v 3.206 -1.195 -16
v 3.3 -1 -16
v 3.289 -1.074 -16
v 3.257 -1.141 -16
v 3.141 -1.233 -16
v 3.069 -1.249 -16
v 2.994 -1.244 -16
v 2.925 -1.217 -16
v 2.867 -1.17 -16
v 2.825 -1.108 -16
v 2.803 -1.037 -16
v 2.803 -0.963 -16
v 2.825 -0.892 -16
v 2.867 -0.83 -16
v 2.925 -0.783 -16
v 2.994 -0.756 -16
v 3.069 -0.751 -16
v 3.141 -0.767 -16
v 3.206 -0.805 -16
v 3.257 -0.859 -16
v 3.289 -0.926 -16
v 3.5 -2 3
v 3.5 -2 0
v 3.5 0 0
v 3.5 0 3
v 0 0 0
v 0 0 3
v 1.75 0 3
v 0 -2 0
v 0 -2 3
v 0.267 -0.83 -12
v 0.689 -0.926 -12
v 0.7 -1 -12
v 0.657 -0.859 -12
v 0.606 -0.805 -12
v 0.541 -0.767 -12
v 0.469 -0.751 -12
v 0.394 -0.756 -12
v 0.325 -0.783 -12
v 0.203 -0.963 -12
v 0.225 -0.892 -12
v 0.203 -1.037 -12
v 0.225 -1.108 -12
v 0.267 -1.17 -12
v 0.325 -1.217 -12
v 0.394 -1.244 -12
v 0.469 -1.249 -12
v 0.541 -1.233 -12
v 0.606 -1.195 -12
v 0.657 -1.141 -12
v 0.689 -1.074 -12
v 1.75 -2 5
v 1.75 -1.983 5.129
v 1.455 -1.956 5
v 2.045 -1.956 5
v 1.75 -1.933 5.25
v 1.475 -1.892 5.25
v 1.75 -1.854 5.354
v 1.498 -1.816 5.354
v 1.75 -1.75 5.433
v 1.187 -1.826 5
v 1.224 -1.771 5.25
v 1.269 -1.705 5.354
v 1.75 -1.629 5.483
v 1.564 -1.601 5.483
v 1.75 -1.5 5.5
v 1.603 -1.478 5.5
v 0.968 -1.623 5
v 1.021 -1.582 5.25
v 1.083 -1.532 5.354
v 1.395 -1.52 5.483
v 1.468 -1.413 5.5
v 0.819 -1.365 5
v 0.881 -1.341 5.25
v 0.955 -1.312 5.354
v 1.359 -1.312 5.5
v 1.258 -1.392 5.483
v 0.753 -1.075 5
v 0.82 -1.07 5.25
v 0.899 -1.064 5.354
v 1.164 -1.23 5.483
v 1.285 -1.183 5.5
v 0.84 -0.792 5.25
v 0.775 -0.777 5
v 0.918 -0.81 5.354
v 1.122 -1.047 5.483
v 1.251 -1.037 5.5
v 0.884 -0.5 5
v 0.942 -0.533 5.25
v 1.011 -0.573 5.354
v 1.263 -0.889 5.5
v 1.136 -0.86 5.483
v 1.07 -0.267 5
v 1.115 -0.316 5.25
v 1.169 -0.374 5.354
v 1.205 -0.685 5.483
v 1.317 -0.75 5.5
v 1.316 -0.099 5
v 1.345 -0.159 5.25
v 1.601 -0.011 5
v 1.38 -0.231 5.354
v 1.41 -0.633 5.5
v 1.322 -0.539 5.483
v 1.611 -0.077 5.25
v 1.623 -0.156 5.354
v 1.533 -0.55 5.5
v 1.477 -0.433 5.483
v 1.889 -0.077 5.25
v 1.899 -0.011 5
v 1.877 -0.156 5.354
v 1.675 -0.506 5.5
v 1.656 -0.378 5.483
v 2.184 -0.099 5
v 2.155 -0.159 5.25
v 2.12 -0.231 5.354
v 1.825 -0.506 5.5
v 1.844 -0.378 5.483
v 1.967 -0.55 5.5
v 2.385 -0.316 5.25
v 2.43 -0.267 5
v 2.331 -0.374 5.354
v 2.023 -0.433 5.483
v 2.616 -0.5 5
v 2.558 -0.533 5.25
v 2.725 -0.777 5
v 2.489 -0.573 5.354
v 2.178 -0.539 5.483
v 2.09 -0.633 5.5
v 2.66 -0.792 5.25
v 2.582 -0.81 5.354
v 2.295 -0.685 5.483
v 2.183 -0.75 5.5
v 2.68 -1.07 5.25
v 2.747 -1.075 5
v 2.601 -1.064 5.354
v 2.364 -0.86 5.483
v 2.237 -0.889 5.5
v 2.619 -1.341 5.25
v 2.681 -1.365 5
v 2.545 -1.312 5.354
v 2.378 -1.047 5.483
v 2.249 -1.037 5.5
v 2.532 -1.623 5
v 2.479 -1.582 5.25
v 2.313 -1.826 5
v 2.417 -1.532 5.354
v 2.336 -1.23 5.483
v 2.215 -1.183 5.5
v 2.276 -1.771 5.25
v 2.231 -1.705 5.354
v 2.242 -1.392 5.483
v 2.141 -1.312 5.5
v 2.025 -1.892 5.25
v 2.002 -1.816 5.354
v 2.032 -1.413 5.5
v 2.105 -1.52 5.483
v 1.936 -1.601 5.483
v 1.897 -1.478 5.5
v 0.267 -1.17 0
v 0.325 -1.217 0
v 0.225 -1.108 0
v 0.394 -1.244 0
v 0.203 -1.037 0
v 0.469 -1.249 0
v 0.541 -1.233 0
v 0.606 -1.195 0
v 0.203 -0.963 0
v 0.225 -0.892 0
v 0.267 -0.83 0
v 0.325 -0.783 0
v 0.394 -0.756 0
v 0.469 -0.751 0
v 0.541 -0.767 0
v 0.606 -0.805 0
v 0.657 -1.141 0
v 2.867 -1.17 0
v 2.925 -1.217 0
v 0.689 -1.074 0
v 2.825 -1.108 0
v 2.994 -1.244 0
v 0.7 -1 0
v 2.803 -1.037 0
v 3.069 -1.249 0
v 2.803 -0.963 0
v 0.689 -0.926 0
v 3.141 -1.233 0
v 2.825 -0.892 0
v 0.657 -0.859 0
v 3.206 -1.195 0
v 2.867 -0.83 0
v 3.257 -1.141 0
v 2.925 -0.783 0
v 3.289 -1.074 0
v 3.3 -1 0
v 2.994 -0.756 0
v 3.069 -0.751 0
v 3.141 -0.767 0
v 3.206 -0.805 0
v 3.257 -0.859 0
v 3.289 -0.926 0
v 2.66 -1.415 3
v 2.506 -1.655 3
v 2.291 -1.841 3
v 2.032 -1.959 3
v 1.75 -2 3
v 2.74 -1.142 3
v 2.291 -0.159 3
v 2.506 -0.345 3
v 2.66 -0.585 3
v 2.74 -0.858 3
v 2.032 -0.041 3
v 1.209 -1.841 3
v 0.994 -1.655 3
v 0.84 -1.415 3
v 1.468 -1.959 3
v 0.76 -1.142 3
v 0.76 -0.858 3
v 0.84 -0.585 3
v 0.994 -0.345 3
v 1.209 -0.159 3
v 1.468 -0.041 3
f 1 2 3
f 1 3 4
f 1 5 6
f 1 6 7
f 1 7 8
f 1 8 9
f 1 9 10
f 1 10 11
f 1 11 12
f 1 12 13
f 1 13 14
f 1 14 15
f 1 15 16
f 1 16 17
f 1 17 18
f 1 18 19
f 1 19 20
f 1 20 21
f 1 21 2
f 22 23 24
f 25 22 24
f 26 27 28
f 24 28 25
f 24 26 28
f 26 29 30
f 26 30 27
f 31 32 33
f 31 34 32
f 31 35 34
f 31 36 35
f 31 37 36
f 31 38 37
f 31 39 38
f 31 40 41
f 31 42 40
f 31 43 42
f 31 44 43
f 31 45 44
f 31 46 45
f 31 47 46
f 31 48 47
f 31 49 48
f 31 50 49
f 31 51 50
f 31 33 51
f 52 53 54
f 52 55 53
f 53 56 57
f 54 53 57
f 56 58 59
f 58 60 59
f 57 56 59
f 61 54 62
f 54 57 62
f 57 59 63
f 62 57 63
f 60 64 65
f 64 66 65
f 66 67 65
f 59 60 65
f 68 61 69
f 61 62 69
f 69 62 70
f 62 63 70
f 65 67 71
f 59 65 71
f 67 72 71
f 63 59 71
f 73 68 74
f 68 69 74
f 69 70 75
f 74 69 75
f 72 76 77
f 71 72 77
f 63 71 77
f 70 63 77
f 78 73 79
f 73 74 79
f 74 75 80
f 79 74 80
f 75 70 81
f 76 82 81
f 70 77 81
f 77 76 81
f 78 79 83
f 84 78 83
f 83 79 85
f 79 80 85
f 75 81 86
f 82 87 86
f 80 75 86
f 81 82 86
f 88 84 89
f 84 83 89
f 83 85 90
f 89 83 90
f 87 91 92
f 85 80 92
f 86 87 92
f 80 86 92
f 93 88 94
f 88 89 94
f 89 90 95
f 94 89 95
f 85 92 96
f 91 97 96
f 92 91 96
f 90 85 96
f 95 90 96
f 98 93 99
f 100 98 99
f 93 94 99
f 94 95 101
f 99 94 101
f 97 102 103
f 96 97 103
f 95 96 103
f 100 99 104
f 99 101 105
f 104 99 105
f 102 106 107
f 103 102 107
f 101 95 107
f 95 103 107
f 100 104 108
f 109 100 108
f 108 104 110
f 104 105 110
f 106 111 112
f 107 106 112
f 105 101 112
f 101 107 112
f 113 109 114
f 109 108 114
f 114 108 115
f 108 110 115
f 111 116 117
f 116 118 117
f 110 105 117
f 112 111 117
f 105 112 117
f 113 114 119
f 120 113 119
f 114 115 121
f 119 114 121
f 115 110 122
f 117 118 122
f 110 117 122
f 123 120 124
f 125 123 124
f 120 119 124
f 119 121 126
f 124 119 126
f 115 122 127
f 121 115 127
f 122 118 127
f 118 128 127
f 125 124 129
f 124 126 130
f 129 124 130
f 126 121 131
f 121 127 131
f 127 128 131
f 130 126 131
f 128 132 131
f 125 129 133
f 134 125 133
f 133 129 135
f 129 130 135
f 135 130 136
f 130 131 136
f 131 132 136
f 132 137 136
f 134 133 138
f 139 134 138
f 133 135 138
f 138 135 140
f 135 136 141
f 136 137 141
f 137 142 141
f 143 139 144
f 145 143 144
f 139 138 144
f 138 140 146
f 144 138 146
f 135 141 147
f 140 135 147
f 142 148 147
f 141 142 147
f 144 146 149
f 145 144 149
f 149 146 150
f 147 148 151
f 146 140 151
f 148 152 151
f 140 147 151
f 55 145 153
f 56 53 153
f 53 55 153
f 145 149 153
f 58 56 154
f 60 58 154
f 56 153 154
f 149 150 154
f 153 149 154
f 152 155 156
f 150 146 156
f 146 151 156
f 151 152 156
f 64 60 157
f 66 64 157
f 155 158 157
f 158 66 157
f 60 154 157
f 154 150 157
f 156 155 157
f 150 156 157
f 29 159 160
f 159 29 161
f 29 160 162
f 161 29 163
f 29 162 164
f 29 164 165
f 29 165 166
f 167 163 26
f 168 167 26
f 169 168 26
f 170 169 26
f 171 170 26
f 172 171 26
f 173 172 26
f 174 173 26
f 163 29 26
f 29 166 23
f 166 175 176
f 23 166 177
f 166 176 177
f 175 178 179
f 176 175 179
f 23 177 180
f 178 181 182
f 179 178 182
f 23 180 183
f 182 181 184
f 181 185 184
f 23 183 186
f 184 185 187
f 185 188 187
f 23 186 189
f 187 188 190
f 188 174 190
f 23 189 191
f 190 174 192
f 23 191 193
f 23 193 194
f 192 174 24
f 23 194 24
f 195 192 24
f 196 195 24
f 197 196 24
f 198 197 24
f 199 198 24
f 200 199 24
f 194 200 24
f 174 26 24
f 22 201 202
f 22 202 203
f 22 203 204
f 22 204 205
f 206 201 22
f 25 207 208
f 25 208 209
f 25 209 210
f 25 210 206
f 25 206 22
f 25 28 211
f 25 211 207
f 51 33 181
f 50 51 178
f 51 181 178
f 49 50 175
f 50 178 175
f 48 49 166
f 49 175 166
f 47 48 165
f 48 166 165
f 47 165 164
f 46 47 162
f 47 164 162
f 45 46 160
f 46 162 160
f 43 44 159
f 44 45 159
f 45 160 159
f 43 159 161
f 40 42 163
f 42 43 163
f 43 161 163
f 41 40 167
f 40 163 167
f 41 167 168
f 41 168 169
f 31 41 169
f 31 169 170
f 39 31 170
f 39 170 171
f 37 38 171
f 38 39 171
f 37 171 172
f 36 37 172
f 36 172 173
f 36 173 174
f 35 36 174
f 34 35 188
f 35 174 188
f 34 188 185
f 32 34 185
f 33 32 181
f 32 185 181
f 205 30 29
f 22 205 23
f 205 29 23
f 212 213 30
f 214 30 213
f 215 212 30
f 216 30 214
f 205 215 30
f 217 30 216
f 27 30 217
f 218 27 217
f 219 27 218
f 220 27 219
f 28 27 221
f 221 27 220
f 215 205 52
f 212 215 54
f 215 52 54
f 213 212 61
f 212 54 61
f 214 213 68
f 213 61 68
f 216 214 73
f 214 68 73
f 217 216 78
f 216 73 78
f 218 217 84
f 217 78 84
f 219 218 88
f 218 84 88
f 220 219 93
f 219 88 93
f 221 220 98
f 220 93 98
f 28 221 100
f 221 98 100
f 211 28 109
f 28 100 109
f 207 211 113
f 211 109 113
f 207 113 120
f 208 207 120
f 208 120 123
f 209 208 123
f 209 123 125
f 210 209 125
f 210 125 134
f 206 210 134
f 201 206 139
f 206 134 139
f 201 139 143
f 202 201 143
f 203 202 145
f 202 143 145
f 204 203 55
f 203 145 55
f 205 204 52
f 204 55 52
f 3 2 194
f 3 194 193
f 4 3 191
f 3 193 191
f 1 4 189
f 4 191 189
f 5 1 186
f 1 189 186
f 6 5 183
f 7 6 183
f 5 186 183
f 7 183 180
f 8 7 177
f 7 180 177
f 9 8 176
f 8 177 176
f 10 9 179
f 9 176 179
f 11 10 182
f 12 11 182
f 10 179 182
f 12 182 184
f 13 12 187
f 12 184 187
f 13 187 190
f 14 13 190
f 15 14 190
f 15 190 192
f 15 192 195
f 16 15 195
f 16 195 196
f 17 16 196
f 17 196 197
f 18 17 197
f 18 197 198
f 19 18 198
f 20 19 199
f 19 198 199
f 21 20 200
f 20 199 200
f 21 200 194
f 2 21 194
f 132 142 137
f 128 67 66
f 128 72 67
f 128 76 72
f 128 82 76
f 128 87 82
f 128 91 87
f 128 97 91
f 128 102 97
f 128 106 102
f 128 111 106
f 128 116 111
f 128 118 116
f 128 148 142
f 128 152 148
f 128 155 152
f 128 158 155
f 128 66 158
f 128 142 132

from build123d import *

# Parameters (mm, degrees)
ESBO_O1_W                = 3.4999999999999996
ESBO_O1_H                = 2
RESSALTO_EXTRUS_O1_DEPTH = 5.5
CORTE_EXTRUS_O1_DEPTH    = 2.5
FILETE1_R                = 0.5
ESBO_O3_R                = 0.2500000000000004
ESBO_O3_R_2              = 0.25
RESSALTO_EXTRUS_O2_DEPTH = 16
ESBO_O4_R                = 0.35087883808626286
CORTE_EXTRUS_O2_DEPTH    = 3.9999999999999933


with BuildPart() as part:
    # Esboço1 → Ressalto-extrusão1 (new body)
    with BuildSketch(Plane.XY):
        with Locations((1.7499999999999998, -1)):
            Rectangle(ESBO_O1_W, ESBO_O1_H)
    extrude(amount=RESSALTO_EXTRUS_O1_DEPTH)

    # Esboço2 → Corte-extrusão1 (cut)
    with BuildSketch(Plane.XY.offset(5.5)):
        with BuildLine():
            Line((0, -2), (1.7499999999999791, -1.9999999999999998))
            ThreePointArc((1.7499999999999791, -2), (0.7499999999999996, -1.000000000000021), (1.7499999999999365, 2.2e-16))
            Line((1.7499999999999365, 0), (0, 0))
            Line((0, 0), (0, -2))
        make_face()
        with BuildLine():
            Line((1.7499999999999791, -1.9999999999999998), (3.4999999999999996, -1.9999999999999996))
            Line((3.4999999999999996, -1.9999999999999996), (3.4999999999999996, 0))
            Line((3.4999999999999996, 0), (1.7499999999999365, 0))
            ThreePointArc((1.7499999999999365, 2.2e-16), (2.457106781186525, -0.29289321881343), (2.75, -1))
            ThreePointArc((2.75, -1.0000000000000002), (2.4571067811865404, -1.7071067811865546), (1.7499999999999791, -2))
        make_face()
    extrude(amount=-CORTE_EXTRUS_O1_DEPTH, mode=Mode.SUBTRACT)

    # Filete1
    filete1_edges = [part.edges().sort_by_distance(p)[0] for p in [
        (1.7500000000000198, 2.2e-16, 5.5),
    ]]
    fillet(filete1_edges, radius=FILETE1_R)

    # Esboço3 → Ressalto-extrusão2 (add)
    with BuildSketch(Plane(origin=(0, 0, 0), x_dir=(-1, 0, 0), z_dir=(0, 0, -1))):
        with Locations(Location((-3.05, -1, 0), (0, 0, 180))):
            Circle(ESBO_O3_R)
        with Locations(Location((-0.45, -1, 0), (0, 0, 180))):
            Circle(ESBO_O3_R_2)
    extrude(amount=RESSALTO_EXTRUS_O2_DEPTH)

    # Esboço4 → Corte-extrusão2 (cut)
    with BuildSketch(Plane(origin=(0, 0, -16), x_dir=(-1, 0, 0), z_dir=(0, 0, -1))):
        with Locations((-0.45, -1)):
            Circle(ESBO_O4_R)
    extrude(amount=-CORTE_EXTRUS_O2_DEPTH, mode=Mode.SUBTRACT)


solid = part.part
